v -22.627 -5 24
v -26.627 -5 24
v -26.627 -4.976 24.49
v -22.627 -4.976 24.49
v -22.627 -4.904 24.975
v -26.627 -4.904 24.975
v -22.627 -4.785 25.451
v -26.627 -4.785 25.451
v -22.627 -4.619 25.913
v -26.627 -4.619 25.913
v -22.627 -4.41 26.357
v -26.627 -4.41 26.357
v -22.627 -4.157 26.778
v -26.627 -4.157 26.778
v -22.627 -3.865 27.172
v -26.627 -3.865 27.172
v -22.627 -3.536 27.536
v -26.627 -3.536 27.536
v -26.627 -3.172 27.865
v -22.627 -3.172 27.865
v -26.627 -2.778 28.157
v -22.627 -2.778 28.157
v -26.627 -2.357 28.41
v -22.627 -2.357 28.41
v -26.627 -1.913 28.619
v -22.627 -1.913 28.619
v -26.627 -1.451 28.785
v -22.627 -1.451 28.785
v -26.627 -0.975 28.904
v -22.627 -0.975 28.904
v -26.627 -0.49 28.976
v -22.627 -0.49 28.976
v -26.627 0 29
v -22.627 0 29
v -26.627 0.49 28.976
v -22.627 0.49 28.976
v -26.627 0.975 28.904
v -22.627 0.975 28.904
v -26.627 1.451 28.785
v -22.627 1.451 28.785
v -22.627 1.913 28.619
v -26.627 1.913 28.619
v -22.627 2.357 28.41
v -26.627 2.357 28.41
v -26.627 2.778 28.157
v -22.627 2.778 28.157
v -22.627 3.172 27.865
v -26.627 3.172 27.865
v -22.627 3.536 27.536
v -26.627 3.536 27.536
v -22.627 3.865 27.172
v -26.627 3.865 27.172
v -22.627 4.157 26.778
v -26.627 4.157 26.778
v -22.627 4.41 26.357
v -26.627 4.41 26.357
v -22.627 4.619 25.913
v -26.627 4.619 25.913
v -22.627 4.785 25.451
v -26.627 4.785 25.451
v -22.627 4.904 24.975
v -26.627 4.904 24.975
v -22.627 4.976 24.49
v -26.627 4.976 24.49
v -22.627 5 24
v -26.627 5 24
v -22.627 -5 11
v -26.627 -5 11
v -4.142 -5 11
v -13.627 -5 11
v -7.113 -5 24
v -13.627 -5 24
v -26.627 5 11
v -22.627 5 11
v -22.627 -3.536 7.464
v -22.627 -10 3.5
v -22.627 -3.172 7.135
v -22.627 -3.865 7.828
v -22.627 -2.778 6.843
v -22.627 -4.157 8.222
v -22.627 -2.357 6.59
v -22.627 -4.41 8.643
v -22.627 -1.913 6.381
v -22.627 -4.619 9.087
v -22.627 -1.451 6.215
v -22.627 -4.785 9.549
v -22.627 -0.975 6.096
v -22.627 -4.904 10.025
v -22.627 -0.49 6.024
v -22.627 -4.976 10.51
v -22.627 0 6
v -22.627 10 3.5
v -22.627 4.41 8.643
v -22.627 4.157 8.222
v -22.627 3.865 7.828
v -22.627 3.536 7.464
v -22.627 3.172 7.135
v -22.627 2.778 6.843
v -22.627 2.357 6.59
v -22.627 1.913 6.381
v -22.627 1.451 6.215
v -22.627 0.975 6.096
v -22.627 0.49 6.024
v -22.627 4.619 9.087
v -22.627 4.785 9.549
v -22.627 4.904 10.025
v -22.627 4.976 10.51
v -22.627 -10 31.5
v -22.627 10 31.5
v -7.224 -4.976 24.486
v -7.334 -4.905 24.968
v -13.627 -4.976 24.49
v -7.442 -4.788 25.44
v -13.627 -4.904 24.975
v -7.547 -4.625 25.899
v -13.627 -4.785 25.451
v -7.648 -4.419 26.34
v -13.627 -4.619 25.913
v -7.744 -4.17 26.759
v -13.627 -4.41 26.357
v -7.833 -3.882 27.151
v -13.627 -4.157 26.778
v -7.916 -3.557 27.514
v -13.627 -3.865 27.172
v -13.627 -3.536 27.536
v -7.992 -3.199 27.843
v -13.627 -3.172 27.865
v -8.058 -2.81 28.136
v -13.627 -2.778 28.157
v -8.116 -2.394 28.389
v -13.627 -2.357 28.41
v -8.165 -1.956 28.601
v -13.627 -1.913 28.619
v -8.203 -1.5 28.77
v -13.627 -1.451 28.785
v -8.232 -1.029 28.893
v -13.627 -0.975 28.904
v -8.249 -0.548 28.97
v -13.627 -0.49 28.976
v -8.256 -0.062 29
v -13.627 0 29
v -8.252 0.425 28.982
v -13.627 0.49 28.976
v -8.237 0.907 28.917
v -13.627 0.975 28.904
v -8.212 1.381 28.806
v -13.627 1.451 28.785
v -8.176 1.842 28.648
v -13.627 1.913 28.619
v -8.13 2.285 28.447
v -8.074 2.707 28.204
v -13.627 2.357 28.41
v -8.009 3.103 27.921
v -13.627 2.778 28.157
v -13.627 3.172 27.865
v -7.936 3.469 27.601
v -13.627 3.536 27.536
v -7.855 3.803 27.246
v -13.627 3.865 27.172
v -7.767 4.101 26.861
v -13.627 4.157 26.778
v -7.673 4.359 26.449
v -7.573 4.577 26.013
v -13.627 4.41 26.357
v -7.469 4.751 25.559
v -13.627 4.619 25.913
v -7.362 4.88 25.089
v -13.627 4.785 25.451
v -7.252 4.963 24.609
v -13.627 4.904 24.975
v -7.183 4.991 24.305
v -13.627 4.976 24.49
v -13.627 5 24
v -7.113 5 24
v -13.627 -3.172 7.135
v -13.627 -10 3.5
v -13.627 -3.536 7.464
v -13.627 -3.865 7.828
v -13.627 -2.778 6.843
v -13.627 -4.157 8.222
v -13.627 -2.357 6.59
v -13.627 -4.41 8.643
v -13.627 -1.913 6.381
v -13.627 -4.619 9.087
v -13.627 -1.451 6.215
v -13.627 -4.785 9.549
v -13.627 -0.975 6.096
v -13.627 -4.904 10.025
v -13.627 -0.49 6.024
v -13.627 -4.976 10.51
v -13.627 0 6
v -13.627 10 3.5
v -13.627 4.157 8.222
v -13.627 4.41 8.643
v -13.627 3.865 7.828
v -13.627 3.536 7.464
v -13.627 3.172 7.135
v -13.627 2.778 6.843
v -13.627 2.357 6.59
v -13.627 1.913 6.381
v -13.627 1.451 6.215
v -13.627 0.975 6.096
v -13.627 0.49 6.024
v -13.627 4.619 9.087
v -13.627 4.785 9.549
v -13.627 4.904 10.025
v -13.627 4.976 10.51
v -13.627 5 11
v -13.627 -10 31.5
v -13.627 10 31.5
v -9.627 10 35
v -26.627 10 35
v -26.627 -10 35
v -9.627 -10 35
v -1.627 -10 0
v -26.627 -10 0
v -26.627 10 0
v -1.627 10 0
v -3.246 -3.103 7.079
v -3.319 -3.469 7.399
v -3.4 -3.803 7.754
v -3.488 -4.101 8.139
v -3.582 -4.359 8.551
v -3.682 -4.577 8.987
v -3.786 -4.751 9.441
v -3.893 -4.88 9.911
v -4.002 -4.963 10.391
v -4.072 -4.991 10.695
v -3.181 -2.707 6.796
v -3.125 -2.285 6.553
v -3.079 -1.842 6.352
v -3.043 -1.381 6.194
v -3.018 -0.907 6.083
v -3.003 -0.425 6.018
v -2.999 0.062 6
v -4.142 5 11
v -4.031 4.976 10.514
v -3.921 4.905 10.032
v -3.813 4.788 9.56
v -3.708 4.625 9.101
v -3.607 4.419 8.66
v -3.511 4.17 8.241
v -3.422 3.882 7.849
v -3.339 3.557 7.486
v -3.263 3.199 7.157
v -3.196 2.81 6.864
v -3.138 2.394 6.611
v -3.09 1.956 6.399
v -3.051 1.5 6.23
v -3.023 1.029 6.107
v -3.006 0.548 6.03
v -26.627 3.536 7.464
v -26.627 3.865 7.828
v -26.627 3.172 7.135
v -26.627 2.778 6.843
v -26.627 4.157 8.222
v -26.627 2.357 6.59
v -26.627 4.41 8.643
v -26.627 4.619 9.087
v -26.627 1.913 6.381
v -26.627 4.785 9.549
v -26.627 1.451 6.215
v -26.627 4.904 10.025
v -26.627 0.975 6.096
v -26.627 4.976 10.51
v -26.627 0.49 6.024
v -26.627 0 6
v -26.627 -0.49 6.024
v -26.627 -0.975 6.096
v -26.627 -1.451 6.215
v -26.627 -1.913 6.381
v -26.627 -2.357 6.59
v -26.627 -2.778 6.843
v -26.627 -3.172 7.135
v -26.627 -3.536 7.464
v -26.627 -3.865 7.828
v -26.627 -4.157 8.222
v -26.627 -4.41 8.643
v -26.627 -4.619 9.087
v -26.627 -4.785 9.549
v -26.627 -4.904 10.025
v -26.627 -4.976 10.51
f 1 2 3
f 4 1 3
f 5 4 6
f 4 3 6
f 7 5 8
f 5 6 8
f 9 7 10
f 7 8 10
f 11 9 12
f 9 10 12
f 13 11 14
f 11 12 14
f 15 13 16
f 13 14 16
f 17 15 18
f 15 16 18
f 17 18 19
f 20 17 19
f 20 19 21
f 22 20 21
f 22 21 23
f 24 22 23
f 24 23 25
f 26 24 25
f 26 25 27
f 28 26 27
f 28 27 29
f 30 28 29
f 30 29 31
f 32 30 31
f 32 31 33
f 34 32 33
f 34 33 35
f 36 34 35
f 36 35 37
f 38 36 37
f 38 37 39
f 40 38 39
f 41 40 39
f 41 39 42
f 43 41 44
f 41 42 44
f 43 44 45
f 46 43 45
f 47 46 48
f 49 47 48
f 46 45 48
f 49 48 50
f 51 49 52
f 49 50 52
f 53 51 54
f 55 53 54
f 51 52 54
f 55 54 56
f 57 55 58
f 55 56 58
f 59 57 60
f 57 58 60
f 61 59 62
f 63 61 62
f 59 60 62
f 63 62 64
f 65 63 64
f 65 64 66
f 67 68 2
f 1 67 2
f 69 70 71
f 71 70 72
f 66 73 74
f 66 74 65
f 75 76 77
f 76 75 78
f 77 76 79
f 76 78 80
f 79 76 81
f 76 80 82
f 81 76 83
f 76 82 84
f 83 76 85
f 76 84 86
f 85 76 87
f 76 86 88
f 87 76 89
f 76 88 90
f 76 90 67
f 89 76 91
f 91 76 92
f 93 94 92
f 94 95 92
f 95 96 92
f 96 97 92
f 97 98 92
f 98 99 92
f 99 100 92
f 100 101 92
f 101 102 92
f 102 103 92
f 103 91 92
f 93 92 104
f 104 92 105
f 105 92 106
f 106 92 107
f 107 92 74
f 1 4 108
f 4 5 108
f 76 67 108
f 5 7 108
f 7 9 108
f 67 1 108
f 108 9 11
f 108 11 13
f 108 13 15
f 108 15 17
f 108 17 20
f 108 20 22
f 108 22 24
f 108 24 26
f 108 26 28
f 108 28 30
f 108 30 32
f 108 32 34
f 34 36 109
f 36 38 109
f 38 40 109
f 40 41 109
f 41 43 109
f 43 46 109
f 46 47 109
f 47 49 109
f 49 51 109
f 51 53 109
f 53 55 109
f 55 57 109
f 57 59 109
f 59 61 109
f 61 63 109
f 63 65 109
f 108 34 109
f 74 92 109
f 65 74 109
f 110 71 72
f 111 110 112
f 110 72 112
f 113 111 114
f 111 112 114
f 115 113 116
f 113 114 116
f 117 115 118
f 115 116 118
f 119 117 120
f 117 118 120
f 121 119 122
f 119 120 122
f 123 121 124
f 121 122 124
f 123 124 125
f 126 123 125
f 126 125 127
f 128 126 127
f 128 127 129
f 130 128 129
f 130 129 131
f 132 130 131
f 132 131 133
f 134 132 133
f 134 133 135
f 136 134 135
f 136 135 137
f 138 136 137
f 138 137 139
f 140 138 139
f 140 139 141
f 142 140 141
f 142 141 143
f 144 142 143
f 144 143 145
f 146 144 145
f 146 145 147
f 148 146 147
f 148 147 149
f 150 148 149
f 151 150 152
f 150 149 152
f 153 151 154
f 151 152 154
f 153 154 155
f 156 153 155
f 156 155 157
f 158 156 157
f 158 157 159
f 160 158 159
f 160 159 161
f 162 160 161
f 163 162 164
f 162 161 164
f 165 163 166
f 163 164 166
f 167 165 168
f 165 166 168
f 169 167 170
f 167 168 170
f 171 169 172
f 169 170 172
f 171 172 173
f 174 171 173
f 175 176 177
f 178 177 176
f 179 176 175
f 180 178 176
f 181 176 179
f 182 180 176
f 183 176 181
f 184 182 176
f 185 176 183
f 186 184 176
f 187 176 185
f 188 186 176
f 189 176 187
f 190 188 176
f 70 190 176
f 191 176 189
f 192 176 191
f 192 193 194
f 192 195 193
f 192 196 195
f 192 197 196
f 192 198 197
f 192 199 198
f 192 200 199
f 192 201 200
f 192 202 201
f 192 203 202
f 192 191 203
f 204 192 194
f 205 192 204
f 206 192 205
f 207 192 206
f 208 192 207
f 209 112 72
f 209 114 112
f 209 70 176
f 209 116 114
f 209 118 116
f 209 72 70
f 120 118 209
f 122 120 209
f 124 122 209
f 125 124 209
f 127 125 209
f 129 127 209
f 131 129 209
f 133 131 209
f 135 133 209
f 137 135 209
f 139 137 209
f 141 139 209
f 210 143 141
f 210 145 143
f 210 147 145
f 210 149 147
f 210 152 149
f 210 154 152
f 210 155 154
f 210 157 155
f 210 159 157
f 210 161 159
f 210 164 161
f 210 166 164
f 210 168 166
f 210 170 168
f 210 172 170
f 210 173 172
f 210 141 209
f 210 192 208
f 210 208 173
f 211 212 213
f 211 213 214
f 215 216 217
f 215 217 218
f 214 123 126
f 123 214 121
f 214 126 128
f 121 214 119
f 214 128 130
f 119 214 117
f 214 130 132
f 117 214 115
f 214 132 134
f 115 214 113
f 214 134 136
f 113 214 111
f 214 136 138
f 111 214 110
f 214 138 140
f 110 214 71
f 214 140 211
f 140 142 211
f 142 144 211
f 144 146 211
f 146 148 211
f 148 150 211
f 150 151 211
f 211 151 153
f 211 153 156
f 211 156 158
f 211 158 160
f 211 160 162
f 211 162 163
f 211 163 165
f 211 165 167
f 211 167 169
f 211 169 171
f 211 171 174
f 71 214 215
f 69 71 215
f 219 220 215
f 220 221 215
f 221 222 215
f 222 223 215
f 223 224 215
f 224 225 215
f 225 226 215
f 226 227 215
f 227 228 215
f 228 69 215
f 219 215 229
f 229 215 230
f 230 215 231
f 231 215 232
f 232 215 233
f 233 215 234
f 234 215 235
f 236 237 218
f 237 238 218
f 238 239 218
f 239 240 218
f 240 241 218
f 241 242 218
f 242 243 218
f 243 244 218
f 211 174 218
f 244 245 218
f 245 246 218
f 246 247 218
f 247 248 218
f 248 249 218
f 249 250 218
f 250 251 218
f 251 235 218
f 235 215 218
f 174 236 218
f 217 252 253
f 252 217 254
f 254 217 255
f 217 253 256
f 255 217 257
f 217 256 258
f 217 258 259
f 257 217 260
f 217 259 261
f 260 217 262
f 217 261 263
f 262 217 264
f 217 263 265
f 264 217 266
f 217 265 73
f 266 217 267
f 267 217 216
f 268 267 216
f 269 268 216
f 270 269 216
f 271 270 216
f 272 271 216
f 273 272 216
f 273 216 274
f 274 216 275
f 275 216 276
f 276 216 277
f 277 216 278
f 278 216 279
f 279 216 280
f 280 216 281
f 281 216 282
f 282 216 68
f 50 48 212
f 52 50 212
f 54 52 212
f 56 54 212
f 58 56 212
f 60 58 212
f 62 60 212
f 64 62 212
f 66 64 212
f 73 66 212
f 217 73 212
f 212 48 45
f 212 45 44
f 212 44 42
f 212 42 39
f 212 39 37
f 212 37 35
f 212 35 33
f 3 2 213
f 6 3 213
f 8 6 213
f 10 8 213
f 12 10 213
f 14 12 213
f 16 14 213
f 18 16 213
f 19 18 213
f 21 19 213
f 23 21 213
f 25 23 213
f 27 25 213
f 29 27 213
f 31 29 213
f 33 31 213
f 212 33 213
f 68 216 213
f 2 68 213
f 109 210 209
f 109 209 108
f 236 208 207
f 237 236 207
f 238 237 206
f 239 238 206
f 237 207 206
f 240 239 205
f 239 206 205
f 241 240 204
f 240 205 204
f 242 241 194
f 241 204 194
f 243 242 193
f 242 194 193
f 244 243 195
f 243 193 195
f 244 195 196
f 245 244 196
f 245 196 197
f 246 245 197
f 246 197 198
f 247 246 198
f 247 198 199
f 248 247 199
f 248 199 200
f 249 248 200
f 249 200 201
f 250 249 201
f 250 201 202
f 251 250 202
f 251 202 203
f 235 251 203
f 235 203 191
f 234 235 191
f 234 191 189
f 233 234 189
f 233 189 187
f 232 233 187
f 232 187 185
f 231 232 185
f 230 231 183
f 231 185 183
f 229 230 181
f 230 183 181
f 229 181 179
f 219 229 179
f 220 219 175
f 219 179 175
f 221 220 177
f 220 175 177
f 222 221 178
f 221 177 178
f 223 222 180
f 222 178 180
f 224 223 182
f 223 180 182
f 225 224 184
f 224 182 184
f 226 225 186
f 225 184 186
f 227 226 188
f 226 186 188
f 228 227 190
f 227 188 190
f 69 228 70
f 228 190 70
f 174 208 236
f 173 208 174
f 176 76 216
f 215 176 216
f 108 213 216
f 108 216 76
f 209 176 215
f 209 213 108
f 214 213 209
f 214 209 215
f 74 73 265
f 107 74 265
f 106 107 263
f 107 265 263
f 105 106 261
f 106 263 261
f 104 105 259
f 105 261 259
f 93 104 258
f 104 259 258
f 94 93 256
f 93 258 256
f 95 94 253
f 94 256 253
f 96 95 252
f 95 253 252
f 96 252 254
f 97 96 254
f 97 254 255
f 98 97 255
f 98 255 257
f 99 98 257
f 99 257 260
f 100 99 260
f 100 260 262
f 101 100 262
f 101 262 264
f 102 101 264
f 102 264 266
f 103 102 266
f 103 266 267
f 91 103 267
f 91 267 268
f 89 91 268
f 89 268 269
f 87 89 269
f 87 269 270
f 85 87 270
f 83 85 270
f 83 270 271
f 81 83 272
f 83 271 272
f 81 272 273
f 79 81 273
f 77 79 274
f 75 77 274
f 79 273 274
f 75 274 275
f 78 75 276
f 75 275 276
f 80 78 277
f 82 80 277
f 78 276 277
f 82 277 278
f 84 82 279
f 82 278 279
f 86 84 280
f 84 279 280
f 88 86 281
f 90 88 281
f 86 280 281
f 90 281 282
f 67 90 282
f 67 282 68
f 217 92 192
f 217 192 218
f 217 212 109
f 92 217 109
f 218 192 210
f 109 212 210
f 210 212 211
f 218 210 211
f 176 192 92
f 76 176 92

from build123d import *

# Parameters (mm, degrees)
F0_W     = 25
F0_H     = 35
F1_DEPTH = 10
F2_SIZE2 = 34.99999
F2_SIZE  = 7.99999
F3_W     = 9
F3_H     = 28
F4_DEPTH = 33.35697
F5_W     = 10
F5_H     = 13
F6_DEPTH = 25


# Not quite as in the source:
# - a fillet or chamfer is up to 0.001 mm smaller than in the source, because OpenCascade refuses the exact size


with BuildPart() as f1:
    # F0 (on Front) → F1 (new body, symmetric)
    with BuildSketch(Plane.XZ):
        with Locations((-14.1274514172, 17.5)):
            Rectangle(F0_W, F0_H)
    extrude(amount=F1_DEPTH, both=True)

    # F2 (size 8 and 35 in the source; OpenCascade refuses exactly that, so slightly less here)
    f2_edges = [f1.edges().sort_by_distance(p)[0] for p in [
        (-1.627451, 0, 35),
    ]]
    f2_side = f1.faces().sort_by_distance((-14.127451, 0, 35))[0]
    chamfer(f2_edges, length=F2_SIZE, length2=F2_SIZE2, reference=f2_side)

    # F3 (on face) → F4 (cut)
    with BuildSketch(Plane(origin=(0, 10, 0), x_dir=(-1, 0, 0), z_dir=(0, 1, 0))):
        with Locations((18.1274514172, 17.5)):
            Rectangle(F3_W, F3_H)
    extrude(amount=-F4_DEPTH, mode=Mode.SUBTRACT)

    # F5 (on face) → F6 (cut)
    with BuildSketch(Plane(origin=(-26.6274514172, 0, 0), x_dir=(0, -1, 0), z_dir=(-1, 0, 0))):
        with BuildLine():
            ThreePointArc((5, 24), (0, 29), (-5, 24))
            Line((-5, 24), (5, 24))
        make_face()
        with Locations((0, 17.5)):
            Rectangle(F5_W, F5_H)
        with BuildLine():
            Line((5, 11), (-5, 11))
            ThreePointArc((-5, 11), (0, 6), (5, 11))
        make_face()
    extrude(amount=-F6_DEPTH, mode=Mode.SUBTRACT)


solid = f1.part
